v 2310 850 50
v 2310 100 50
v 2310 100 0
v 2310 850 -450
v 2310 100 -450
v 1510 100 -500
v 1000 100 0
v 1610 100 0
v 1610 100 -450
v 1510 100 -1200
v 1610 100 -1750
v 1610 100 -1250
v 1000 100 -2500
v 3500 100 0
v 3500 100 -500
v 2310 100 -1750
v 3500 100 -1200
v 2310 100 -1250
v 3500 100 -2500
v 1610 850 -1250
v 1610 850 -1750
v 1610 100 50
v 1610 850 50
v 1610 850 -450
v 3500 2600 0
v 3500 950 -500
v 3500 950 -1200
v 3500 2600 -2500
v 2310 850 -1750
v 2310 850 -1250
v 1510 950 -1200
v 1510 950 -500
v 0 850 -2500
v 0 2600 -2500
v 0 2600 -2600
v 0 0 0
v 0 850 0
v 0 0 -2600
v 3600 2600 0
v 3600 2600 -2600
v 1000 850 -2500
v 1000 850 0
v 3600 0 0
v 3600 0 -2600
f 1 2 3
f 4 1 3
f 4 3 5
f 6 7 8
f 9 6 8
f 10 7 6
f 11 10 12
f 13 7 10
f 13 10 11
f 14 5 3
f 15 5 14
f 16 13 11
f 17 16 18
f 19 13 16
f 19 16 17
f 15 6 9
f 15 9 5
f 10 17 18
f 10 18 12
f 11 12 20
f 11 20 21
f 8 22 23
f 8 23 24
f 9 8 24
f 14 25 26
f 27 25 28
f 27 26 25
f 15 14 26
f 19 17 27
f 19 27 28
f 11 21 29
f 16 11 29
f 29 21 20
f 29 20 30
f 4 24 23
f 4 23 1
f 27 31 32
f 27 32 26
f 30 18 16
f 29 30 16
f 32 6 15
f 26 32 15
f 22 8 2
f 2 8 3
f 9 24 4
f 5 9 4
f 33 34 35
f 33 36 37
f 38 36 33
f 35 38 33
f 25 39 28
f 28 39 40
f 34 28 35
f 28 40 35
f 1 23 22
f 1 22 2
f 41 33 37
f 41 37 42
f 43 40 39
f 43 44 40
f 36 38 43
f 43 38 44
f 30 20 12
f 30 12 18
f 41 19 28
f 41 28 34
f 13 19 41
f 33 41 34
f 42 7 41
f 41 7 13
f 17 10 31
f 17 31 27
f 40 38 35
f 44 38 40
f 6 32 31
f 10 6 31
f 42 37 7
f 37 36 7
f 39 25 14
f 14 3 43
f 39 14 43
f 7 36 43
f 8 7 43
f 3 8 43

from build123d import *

# Parameters (mm, degrees)
SKETCH1_W           = 3600
SKETCH1_H           = 2600
BOSS_EXTRUDE1_DEPTH = 100
BOSS_EXTRUDE2_DEPTH = 2500
SKETCH4_W           = 2000
SKETCH4_H           = 700
BOSS_EXTRUDE3_DEPTH = 850
SKETCH5_W           = 1000
SKETCH5_H           = 2500
BOSS_EXTRUDE4_DEPTH = 750
SKETCH6_W           = 700
SKETCH6_H           = 500
BOSS_EXTRUDE5_DEPTH = 750
SKETCH7_W           = 700
SKETCH7_H           = 500
BOSS_EXTRUDE6_DEPTH = 750


with BuildPart() as part:
    # Sketch1 → Boss-Extrude1 (new body)
    with BuildSketch(Plane(origin=(0, 0, 0), x_dir=(1, 0, 0), z_dir=(0, 1, 0))):
        with Locations((1800, 1300)):
            Rectangle(SKETCH1_W, SKETCH1_H)
    extrude(amount=BOSS_EXTRUDE1_DEPTH)

    # Sketch2 → Boss-Extrude2 (add)
    with BuildSketch(Plane(origin=(0, 100, 0), x_dir=(1, 0, 0), z_dir=(0, 1, 0))):
        Polygon((3600, 0), (3500, 0), (3500, 2500), (0, 2500), (0, 2600), (3600, 2600), align=None)
    extrude(amount=BOSS_EXTRUDE2_DEPTH)

    # Sketch4 → Boss-Extrude3 (add)
    with BuildSketch(Plane(origin=(0, 100, 0), x_dir=(1, 0, 0), z_dir=(0, 1, 0))):
        with Locations((2510, 850)):
            Rectangle(SKETCH4_W, SKETCH4_H)
    extrude(amount=BOSS_EXTRUDE3_DEPTH)

    # Sketch5 → Boss-Extrude4 (add)
    with BuildSketch(Plane(origin=(0, 100, 0), x_dir=(1, 0, 0), z_dir=(0, 1, 0))):
        with Locations((500, 1250)):
            Rectangle(SKETCH5_W, SKETCH5_H)
    extrude(amount=BOSS_EXTRUDE4_DEPTH)

    # Sketch6 → Boss-Extrude5 (add)
    with BuildSketch(Plane(origin=(0, 100, 0), x_dir=(1, 0, 0), z_dir=(0, 1, 0))):
        with Locations((1960, 1500)):
            Rectangle(SKETCH6_W, SKETCH6_H)
    extrude(amount=BOSS_EXTRUDE5_DEPTH)

    # Sketch7 → Boss-Extrude6 (add)
    with BuildSketch(Plane(origin=(0, 100, 0), x_dir=(1, 0, 0), z_dir=(0, 1, 0))):
        with Locations((1960, 200)):
            Rectangle(SKETCH7_W, SKETCH7_H)
    extrude(amount=BOSS_EXTRUDE6_DEPTH)


solid = part.part
